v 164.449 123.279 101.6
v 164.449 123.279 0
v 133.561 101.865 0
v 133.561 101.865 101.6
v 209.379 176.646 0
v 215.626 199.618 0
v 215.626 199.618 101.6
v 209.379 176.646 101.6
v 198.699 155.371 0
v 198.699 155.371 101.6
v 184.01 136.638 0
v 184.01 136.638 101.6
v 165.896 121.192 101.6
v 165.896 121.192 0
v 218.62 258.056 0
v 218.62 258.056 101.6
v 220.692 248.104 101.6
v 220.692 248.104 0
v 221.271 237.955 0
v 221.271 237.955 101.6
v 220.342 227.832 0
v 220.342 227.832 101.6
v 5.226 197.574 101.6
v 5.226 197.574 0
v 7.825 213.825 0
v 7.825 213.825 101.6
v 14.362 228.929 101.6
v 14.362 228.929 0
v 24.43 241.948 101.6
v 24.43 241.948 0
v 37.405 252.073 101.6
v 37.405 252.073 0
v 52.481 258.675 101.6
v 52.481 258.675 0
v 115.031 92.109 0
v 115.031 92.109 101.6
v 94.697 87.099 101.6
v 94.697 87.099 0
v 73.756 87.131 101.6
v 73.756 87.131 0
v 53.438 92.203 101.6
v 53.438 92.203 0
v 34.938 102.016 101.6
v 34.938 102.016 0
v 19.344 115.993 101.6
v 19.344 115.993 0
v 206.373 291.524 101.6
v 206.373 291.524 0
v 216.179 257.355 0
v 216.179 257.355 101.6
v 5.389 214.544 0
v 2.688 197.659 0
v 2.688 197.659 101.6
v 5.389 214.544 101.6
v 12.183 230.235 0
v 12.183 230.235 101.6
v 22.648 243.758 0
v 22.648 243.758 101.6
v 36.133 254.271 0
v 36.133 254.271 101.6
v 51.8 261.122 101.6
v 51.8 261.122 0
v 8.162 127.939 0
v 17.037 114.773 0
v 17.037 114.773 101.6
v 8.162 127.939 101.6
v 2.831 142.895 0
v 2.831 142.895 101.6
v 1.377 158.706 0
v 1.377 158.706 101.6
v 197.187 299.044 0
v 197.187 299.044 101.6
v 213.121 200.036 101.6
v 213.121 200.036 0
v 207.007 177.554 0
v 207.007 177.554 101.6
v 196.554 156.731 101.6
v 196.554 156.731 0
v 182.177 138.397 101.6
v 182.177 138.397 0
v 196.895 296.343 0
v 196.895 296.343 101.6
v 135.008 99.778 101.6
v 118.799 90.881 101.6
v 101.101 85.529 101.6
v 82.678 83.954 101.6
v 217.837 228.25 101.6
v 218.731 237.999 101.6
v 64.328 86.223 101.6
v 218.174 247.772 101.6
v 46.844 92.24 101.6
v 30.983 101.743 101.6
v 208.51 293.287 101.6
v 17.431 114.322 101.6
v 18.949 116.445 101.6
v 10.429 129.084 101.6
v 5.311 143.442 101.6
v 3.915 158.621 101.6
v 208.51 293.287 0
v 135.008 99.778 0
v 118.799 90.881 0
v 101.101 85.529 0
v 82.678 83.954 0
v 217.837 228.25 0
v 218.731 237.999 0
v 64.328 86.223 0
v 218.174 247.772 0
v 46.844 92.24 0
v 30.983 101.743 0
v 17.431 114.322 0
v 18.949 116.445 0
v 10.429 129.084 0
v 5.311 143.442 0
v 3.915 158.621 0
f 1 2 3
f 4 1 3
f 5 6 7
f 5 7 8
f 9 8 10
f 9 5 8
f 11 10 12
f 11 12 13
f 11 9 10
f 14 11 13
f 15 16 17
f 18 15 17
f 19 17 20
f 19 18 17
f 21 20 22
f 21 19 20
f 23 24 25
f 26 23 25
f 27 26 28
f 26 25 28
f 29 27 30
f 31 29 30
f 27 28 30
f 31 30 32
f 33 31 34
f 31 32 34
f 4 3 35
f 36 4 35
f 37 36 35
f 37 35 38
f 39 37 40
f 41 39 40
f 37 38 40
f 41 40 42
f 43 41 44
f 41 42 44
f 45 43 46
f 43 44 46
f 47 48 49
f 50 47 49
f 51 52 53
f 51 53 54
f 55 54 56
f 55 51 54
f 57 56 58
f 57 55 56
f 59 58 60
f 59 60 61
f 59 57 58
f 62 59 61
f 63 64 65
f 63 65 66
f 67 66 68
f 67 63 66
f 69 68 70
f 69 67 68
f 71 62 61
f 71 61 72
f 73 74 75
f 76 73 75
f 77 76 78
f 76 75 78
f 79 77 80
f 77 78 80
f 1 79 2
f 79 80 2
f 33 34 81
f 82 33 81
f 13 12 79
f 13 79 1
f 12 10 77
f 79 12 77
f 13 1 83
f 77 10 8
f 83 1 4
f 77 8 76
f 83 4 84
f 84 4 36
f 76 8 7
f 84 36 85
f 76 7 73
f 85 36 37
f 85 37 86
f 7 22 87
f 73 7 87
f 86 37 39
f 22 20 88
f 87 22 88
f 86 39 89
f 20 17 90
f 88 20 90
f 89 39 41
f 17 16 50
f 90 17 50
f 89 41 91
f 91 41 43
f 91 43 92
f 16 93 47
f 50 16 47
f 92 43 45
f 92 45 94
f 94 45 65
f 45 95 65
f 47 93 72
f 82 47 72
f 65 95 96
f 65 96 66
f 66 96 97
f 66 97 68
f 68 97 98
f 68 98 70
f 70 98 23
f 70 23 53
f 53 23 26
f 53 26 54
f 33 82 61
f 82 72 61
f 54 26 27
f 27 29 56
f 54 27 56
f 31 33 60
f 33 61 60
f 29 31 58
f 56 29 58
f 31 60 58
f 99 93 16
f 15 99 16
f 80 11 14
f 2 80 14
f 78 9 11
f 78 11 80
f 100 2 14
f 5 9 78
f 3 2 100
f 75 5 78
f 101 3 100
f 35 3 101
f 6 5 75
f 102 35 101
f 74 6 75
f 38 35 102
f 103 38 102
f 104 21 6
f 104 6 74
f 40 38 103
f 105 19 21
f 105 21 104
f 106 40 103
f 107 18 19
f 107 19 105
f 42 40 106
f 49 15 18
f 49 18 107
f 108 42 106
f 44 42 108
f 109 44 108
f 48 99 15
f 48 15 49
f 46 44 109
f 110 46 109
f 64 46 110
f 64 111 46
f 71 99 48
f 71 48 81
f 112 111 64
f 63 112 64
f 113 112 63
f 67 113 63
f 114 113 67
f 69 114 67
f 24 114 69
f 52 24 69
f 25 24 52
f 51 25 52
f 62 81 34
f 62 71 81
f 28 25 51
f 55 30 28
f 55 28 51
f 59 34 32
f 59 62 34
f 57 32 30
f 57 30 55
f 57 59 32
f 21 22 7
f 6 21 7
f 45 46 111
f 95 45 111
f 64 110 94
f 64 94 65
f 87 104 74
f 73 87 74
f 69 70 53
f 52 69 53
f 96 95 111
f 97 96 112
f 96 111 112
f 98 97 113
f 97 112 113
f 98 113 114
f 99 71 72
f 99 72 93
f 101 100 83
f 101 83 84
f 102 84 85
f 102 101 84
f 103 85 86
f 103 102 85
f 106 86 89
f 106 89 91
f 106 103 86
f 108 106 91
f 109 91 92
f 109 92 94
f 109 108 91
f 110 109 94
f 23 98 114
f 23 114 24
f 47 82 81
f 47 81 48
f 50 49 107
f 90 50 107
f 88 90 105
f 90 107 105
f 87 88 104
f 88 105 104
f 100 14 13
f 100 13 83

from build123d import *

# Parameters (mm, degrees)
BOSS_EXTRUDE1_DEPTH = 101.6


with BuildPart() as part:
    # Sketch1 → Boss-Extrude1 (new body)
    with BuildSketch(Plane.XY):
        with BuildLine():
            Line((51.799660555, 261.122372087), (197.186615042, 299.043929939))
            Line((197.186615042, 299.043929939), (208.509660322, 293.287113842))
            Line((208.509660322, 293.287113842), (218.620076974, 258.056123915))
            ThreePointArc((218.620076974, 258.056123915), (221.169715366, 243.040079022), (220.342179316, 227.83161282))
            Line((220.342179316, 227.83161282), (215.6257762, 199.617635489))
            ThreePointArc((215.6257762, 199.617635489), (198.699129745, 155.371015972), (165.895883475, 121.19175716))
            Line((165.895883475, 121.19175716), (135.007693071, 99.777817102))
            ThreePointArc((135.007693071, 99.777817102), (73.443869598, 84.610101156), (17.431420723, 114.321538997))
            Line((17.431420723, 114.321538997), (17.036655023, 114.773038812))
            ThreePointArc((17.036655023, 114.773038812), (5.027038746, 135.249887254), (1.376775545, 158.7063956))
            Line((1.376775545, 158.7063956), (2.687868659, 197.659197646))
            ThreePointArc((2.687868659, 197.659197646), (16.992541419, 237.323825473), (51.799660555, 261.122372087))
        make_face()
        with BuildLine():
            Line((52.480544155, 258.674987582), (196.894837031, 296.342844243))
            Line((196.894837031, 296.342844243), (206.373128662, 291.523930207))
            Line((206.373128662, 291.523930207), (216.178620917, 257.355486833))
            ThreePointArc((216.178620917, 257.355486833), (218.633828258, 242.895591751), (217.836941691, 228.250402074))
            Line((217.836941691, 228.250402074), (213.120538575, 200.036424744))
            ThreePointArc((213.120538575, 200.036424744), (196.554033533, 156.731222664), (164.448728673, 123.279182124))
            Line((164.448728673, 123.279182124), (133.560538269, 101.865242067))
            ThreePointArc((133.560538269, 101.865242067), (73.755681182, 87.130889432), (19.343587989, 115.99342905))
            Line((19.343587989, 115.99342905), (18.948822289, 116.444928865))
            ThreePointArc((18.948822289, 116.444928865), (7.419590663, 136.102703369), (3.91533799, 158.620951381))
            Line((3.91533799, 158.620951381), (5.226431104, 197.573753427))
            ThreePointArc((5.226431104, 197.573753427), (18.98894665, 235.75335118), (52.480544155, 258.674987582))
        make_face(mode=Mode.SUBTRACT)
    extrude(amount=BOSS_EXTRUDE1_DEPTH)


solid = part.part
